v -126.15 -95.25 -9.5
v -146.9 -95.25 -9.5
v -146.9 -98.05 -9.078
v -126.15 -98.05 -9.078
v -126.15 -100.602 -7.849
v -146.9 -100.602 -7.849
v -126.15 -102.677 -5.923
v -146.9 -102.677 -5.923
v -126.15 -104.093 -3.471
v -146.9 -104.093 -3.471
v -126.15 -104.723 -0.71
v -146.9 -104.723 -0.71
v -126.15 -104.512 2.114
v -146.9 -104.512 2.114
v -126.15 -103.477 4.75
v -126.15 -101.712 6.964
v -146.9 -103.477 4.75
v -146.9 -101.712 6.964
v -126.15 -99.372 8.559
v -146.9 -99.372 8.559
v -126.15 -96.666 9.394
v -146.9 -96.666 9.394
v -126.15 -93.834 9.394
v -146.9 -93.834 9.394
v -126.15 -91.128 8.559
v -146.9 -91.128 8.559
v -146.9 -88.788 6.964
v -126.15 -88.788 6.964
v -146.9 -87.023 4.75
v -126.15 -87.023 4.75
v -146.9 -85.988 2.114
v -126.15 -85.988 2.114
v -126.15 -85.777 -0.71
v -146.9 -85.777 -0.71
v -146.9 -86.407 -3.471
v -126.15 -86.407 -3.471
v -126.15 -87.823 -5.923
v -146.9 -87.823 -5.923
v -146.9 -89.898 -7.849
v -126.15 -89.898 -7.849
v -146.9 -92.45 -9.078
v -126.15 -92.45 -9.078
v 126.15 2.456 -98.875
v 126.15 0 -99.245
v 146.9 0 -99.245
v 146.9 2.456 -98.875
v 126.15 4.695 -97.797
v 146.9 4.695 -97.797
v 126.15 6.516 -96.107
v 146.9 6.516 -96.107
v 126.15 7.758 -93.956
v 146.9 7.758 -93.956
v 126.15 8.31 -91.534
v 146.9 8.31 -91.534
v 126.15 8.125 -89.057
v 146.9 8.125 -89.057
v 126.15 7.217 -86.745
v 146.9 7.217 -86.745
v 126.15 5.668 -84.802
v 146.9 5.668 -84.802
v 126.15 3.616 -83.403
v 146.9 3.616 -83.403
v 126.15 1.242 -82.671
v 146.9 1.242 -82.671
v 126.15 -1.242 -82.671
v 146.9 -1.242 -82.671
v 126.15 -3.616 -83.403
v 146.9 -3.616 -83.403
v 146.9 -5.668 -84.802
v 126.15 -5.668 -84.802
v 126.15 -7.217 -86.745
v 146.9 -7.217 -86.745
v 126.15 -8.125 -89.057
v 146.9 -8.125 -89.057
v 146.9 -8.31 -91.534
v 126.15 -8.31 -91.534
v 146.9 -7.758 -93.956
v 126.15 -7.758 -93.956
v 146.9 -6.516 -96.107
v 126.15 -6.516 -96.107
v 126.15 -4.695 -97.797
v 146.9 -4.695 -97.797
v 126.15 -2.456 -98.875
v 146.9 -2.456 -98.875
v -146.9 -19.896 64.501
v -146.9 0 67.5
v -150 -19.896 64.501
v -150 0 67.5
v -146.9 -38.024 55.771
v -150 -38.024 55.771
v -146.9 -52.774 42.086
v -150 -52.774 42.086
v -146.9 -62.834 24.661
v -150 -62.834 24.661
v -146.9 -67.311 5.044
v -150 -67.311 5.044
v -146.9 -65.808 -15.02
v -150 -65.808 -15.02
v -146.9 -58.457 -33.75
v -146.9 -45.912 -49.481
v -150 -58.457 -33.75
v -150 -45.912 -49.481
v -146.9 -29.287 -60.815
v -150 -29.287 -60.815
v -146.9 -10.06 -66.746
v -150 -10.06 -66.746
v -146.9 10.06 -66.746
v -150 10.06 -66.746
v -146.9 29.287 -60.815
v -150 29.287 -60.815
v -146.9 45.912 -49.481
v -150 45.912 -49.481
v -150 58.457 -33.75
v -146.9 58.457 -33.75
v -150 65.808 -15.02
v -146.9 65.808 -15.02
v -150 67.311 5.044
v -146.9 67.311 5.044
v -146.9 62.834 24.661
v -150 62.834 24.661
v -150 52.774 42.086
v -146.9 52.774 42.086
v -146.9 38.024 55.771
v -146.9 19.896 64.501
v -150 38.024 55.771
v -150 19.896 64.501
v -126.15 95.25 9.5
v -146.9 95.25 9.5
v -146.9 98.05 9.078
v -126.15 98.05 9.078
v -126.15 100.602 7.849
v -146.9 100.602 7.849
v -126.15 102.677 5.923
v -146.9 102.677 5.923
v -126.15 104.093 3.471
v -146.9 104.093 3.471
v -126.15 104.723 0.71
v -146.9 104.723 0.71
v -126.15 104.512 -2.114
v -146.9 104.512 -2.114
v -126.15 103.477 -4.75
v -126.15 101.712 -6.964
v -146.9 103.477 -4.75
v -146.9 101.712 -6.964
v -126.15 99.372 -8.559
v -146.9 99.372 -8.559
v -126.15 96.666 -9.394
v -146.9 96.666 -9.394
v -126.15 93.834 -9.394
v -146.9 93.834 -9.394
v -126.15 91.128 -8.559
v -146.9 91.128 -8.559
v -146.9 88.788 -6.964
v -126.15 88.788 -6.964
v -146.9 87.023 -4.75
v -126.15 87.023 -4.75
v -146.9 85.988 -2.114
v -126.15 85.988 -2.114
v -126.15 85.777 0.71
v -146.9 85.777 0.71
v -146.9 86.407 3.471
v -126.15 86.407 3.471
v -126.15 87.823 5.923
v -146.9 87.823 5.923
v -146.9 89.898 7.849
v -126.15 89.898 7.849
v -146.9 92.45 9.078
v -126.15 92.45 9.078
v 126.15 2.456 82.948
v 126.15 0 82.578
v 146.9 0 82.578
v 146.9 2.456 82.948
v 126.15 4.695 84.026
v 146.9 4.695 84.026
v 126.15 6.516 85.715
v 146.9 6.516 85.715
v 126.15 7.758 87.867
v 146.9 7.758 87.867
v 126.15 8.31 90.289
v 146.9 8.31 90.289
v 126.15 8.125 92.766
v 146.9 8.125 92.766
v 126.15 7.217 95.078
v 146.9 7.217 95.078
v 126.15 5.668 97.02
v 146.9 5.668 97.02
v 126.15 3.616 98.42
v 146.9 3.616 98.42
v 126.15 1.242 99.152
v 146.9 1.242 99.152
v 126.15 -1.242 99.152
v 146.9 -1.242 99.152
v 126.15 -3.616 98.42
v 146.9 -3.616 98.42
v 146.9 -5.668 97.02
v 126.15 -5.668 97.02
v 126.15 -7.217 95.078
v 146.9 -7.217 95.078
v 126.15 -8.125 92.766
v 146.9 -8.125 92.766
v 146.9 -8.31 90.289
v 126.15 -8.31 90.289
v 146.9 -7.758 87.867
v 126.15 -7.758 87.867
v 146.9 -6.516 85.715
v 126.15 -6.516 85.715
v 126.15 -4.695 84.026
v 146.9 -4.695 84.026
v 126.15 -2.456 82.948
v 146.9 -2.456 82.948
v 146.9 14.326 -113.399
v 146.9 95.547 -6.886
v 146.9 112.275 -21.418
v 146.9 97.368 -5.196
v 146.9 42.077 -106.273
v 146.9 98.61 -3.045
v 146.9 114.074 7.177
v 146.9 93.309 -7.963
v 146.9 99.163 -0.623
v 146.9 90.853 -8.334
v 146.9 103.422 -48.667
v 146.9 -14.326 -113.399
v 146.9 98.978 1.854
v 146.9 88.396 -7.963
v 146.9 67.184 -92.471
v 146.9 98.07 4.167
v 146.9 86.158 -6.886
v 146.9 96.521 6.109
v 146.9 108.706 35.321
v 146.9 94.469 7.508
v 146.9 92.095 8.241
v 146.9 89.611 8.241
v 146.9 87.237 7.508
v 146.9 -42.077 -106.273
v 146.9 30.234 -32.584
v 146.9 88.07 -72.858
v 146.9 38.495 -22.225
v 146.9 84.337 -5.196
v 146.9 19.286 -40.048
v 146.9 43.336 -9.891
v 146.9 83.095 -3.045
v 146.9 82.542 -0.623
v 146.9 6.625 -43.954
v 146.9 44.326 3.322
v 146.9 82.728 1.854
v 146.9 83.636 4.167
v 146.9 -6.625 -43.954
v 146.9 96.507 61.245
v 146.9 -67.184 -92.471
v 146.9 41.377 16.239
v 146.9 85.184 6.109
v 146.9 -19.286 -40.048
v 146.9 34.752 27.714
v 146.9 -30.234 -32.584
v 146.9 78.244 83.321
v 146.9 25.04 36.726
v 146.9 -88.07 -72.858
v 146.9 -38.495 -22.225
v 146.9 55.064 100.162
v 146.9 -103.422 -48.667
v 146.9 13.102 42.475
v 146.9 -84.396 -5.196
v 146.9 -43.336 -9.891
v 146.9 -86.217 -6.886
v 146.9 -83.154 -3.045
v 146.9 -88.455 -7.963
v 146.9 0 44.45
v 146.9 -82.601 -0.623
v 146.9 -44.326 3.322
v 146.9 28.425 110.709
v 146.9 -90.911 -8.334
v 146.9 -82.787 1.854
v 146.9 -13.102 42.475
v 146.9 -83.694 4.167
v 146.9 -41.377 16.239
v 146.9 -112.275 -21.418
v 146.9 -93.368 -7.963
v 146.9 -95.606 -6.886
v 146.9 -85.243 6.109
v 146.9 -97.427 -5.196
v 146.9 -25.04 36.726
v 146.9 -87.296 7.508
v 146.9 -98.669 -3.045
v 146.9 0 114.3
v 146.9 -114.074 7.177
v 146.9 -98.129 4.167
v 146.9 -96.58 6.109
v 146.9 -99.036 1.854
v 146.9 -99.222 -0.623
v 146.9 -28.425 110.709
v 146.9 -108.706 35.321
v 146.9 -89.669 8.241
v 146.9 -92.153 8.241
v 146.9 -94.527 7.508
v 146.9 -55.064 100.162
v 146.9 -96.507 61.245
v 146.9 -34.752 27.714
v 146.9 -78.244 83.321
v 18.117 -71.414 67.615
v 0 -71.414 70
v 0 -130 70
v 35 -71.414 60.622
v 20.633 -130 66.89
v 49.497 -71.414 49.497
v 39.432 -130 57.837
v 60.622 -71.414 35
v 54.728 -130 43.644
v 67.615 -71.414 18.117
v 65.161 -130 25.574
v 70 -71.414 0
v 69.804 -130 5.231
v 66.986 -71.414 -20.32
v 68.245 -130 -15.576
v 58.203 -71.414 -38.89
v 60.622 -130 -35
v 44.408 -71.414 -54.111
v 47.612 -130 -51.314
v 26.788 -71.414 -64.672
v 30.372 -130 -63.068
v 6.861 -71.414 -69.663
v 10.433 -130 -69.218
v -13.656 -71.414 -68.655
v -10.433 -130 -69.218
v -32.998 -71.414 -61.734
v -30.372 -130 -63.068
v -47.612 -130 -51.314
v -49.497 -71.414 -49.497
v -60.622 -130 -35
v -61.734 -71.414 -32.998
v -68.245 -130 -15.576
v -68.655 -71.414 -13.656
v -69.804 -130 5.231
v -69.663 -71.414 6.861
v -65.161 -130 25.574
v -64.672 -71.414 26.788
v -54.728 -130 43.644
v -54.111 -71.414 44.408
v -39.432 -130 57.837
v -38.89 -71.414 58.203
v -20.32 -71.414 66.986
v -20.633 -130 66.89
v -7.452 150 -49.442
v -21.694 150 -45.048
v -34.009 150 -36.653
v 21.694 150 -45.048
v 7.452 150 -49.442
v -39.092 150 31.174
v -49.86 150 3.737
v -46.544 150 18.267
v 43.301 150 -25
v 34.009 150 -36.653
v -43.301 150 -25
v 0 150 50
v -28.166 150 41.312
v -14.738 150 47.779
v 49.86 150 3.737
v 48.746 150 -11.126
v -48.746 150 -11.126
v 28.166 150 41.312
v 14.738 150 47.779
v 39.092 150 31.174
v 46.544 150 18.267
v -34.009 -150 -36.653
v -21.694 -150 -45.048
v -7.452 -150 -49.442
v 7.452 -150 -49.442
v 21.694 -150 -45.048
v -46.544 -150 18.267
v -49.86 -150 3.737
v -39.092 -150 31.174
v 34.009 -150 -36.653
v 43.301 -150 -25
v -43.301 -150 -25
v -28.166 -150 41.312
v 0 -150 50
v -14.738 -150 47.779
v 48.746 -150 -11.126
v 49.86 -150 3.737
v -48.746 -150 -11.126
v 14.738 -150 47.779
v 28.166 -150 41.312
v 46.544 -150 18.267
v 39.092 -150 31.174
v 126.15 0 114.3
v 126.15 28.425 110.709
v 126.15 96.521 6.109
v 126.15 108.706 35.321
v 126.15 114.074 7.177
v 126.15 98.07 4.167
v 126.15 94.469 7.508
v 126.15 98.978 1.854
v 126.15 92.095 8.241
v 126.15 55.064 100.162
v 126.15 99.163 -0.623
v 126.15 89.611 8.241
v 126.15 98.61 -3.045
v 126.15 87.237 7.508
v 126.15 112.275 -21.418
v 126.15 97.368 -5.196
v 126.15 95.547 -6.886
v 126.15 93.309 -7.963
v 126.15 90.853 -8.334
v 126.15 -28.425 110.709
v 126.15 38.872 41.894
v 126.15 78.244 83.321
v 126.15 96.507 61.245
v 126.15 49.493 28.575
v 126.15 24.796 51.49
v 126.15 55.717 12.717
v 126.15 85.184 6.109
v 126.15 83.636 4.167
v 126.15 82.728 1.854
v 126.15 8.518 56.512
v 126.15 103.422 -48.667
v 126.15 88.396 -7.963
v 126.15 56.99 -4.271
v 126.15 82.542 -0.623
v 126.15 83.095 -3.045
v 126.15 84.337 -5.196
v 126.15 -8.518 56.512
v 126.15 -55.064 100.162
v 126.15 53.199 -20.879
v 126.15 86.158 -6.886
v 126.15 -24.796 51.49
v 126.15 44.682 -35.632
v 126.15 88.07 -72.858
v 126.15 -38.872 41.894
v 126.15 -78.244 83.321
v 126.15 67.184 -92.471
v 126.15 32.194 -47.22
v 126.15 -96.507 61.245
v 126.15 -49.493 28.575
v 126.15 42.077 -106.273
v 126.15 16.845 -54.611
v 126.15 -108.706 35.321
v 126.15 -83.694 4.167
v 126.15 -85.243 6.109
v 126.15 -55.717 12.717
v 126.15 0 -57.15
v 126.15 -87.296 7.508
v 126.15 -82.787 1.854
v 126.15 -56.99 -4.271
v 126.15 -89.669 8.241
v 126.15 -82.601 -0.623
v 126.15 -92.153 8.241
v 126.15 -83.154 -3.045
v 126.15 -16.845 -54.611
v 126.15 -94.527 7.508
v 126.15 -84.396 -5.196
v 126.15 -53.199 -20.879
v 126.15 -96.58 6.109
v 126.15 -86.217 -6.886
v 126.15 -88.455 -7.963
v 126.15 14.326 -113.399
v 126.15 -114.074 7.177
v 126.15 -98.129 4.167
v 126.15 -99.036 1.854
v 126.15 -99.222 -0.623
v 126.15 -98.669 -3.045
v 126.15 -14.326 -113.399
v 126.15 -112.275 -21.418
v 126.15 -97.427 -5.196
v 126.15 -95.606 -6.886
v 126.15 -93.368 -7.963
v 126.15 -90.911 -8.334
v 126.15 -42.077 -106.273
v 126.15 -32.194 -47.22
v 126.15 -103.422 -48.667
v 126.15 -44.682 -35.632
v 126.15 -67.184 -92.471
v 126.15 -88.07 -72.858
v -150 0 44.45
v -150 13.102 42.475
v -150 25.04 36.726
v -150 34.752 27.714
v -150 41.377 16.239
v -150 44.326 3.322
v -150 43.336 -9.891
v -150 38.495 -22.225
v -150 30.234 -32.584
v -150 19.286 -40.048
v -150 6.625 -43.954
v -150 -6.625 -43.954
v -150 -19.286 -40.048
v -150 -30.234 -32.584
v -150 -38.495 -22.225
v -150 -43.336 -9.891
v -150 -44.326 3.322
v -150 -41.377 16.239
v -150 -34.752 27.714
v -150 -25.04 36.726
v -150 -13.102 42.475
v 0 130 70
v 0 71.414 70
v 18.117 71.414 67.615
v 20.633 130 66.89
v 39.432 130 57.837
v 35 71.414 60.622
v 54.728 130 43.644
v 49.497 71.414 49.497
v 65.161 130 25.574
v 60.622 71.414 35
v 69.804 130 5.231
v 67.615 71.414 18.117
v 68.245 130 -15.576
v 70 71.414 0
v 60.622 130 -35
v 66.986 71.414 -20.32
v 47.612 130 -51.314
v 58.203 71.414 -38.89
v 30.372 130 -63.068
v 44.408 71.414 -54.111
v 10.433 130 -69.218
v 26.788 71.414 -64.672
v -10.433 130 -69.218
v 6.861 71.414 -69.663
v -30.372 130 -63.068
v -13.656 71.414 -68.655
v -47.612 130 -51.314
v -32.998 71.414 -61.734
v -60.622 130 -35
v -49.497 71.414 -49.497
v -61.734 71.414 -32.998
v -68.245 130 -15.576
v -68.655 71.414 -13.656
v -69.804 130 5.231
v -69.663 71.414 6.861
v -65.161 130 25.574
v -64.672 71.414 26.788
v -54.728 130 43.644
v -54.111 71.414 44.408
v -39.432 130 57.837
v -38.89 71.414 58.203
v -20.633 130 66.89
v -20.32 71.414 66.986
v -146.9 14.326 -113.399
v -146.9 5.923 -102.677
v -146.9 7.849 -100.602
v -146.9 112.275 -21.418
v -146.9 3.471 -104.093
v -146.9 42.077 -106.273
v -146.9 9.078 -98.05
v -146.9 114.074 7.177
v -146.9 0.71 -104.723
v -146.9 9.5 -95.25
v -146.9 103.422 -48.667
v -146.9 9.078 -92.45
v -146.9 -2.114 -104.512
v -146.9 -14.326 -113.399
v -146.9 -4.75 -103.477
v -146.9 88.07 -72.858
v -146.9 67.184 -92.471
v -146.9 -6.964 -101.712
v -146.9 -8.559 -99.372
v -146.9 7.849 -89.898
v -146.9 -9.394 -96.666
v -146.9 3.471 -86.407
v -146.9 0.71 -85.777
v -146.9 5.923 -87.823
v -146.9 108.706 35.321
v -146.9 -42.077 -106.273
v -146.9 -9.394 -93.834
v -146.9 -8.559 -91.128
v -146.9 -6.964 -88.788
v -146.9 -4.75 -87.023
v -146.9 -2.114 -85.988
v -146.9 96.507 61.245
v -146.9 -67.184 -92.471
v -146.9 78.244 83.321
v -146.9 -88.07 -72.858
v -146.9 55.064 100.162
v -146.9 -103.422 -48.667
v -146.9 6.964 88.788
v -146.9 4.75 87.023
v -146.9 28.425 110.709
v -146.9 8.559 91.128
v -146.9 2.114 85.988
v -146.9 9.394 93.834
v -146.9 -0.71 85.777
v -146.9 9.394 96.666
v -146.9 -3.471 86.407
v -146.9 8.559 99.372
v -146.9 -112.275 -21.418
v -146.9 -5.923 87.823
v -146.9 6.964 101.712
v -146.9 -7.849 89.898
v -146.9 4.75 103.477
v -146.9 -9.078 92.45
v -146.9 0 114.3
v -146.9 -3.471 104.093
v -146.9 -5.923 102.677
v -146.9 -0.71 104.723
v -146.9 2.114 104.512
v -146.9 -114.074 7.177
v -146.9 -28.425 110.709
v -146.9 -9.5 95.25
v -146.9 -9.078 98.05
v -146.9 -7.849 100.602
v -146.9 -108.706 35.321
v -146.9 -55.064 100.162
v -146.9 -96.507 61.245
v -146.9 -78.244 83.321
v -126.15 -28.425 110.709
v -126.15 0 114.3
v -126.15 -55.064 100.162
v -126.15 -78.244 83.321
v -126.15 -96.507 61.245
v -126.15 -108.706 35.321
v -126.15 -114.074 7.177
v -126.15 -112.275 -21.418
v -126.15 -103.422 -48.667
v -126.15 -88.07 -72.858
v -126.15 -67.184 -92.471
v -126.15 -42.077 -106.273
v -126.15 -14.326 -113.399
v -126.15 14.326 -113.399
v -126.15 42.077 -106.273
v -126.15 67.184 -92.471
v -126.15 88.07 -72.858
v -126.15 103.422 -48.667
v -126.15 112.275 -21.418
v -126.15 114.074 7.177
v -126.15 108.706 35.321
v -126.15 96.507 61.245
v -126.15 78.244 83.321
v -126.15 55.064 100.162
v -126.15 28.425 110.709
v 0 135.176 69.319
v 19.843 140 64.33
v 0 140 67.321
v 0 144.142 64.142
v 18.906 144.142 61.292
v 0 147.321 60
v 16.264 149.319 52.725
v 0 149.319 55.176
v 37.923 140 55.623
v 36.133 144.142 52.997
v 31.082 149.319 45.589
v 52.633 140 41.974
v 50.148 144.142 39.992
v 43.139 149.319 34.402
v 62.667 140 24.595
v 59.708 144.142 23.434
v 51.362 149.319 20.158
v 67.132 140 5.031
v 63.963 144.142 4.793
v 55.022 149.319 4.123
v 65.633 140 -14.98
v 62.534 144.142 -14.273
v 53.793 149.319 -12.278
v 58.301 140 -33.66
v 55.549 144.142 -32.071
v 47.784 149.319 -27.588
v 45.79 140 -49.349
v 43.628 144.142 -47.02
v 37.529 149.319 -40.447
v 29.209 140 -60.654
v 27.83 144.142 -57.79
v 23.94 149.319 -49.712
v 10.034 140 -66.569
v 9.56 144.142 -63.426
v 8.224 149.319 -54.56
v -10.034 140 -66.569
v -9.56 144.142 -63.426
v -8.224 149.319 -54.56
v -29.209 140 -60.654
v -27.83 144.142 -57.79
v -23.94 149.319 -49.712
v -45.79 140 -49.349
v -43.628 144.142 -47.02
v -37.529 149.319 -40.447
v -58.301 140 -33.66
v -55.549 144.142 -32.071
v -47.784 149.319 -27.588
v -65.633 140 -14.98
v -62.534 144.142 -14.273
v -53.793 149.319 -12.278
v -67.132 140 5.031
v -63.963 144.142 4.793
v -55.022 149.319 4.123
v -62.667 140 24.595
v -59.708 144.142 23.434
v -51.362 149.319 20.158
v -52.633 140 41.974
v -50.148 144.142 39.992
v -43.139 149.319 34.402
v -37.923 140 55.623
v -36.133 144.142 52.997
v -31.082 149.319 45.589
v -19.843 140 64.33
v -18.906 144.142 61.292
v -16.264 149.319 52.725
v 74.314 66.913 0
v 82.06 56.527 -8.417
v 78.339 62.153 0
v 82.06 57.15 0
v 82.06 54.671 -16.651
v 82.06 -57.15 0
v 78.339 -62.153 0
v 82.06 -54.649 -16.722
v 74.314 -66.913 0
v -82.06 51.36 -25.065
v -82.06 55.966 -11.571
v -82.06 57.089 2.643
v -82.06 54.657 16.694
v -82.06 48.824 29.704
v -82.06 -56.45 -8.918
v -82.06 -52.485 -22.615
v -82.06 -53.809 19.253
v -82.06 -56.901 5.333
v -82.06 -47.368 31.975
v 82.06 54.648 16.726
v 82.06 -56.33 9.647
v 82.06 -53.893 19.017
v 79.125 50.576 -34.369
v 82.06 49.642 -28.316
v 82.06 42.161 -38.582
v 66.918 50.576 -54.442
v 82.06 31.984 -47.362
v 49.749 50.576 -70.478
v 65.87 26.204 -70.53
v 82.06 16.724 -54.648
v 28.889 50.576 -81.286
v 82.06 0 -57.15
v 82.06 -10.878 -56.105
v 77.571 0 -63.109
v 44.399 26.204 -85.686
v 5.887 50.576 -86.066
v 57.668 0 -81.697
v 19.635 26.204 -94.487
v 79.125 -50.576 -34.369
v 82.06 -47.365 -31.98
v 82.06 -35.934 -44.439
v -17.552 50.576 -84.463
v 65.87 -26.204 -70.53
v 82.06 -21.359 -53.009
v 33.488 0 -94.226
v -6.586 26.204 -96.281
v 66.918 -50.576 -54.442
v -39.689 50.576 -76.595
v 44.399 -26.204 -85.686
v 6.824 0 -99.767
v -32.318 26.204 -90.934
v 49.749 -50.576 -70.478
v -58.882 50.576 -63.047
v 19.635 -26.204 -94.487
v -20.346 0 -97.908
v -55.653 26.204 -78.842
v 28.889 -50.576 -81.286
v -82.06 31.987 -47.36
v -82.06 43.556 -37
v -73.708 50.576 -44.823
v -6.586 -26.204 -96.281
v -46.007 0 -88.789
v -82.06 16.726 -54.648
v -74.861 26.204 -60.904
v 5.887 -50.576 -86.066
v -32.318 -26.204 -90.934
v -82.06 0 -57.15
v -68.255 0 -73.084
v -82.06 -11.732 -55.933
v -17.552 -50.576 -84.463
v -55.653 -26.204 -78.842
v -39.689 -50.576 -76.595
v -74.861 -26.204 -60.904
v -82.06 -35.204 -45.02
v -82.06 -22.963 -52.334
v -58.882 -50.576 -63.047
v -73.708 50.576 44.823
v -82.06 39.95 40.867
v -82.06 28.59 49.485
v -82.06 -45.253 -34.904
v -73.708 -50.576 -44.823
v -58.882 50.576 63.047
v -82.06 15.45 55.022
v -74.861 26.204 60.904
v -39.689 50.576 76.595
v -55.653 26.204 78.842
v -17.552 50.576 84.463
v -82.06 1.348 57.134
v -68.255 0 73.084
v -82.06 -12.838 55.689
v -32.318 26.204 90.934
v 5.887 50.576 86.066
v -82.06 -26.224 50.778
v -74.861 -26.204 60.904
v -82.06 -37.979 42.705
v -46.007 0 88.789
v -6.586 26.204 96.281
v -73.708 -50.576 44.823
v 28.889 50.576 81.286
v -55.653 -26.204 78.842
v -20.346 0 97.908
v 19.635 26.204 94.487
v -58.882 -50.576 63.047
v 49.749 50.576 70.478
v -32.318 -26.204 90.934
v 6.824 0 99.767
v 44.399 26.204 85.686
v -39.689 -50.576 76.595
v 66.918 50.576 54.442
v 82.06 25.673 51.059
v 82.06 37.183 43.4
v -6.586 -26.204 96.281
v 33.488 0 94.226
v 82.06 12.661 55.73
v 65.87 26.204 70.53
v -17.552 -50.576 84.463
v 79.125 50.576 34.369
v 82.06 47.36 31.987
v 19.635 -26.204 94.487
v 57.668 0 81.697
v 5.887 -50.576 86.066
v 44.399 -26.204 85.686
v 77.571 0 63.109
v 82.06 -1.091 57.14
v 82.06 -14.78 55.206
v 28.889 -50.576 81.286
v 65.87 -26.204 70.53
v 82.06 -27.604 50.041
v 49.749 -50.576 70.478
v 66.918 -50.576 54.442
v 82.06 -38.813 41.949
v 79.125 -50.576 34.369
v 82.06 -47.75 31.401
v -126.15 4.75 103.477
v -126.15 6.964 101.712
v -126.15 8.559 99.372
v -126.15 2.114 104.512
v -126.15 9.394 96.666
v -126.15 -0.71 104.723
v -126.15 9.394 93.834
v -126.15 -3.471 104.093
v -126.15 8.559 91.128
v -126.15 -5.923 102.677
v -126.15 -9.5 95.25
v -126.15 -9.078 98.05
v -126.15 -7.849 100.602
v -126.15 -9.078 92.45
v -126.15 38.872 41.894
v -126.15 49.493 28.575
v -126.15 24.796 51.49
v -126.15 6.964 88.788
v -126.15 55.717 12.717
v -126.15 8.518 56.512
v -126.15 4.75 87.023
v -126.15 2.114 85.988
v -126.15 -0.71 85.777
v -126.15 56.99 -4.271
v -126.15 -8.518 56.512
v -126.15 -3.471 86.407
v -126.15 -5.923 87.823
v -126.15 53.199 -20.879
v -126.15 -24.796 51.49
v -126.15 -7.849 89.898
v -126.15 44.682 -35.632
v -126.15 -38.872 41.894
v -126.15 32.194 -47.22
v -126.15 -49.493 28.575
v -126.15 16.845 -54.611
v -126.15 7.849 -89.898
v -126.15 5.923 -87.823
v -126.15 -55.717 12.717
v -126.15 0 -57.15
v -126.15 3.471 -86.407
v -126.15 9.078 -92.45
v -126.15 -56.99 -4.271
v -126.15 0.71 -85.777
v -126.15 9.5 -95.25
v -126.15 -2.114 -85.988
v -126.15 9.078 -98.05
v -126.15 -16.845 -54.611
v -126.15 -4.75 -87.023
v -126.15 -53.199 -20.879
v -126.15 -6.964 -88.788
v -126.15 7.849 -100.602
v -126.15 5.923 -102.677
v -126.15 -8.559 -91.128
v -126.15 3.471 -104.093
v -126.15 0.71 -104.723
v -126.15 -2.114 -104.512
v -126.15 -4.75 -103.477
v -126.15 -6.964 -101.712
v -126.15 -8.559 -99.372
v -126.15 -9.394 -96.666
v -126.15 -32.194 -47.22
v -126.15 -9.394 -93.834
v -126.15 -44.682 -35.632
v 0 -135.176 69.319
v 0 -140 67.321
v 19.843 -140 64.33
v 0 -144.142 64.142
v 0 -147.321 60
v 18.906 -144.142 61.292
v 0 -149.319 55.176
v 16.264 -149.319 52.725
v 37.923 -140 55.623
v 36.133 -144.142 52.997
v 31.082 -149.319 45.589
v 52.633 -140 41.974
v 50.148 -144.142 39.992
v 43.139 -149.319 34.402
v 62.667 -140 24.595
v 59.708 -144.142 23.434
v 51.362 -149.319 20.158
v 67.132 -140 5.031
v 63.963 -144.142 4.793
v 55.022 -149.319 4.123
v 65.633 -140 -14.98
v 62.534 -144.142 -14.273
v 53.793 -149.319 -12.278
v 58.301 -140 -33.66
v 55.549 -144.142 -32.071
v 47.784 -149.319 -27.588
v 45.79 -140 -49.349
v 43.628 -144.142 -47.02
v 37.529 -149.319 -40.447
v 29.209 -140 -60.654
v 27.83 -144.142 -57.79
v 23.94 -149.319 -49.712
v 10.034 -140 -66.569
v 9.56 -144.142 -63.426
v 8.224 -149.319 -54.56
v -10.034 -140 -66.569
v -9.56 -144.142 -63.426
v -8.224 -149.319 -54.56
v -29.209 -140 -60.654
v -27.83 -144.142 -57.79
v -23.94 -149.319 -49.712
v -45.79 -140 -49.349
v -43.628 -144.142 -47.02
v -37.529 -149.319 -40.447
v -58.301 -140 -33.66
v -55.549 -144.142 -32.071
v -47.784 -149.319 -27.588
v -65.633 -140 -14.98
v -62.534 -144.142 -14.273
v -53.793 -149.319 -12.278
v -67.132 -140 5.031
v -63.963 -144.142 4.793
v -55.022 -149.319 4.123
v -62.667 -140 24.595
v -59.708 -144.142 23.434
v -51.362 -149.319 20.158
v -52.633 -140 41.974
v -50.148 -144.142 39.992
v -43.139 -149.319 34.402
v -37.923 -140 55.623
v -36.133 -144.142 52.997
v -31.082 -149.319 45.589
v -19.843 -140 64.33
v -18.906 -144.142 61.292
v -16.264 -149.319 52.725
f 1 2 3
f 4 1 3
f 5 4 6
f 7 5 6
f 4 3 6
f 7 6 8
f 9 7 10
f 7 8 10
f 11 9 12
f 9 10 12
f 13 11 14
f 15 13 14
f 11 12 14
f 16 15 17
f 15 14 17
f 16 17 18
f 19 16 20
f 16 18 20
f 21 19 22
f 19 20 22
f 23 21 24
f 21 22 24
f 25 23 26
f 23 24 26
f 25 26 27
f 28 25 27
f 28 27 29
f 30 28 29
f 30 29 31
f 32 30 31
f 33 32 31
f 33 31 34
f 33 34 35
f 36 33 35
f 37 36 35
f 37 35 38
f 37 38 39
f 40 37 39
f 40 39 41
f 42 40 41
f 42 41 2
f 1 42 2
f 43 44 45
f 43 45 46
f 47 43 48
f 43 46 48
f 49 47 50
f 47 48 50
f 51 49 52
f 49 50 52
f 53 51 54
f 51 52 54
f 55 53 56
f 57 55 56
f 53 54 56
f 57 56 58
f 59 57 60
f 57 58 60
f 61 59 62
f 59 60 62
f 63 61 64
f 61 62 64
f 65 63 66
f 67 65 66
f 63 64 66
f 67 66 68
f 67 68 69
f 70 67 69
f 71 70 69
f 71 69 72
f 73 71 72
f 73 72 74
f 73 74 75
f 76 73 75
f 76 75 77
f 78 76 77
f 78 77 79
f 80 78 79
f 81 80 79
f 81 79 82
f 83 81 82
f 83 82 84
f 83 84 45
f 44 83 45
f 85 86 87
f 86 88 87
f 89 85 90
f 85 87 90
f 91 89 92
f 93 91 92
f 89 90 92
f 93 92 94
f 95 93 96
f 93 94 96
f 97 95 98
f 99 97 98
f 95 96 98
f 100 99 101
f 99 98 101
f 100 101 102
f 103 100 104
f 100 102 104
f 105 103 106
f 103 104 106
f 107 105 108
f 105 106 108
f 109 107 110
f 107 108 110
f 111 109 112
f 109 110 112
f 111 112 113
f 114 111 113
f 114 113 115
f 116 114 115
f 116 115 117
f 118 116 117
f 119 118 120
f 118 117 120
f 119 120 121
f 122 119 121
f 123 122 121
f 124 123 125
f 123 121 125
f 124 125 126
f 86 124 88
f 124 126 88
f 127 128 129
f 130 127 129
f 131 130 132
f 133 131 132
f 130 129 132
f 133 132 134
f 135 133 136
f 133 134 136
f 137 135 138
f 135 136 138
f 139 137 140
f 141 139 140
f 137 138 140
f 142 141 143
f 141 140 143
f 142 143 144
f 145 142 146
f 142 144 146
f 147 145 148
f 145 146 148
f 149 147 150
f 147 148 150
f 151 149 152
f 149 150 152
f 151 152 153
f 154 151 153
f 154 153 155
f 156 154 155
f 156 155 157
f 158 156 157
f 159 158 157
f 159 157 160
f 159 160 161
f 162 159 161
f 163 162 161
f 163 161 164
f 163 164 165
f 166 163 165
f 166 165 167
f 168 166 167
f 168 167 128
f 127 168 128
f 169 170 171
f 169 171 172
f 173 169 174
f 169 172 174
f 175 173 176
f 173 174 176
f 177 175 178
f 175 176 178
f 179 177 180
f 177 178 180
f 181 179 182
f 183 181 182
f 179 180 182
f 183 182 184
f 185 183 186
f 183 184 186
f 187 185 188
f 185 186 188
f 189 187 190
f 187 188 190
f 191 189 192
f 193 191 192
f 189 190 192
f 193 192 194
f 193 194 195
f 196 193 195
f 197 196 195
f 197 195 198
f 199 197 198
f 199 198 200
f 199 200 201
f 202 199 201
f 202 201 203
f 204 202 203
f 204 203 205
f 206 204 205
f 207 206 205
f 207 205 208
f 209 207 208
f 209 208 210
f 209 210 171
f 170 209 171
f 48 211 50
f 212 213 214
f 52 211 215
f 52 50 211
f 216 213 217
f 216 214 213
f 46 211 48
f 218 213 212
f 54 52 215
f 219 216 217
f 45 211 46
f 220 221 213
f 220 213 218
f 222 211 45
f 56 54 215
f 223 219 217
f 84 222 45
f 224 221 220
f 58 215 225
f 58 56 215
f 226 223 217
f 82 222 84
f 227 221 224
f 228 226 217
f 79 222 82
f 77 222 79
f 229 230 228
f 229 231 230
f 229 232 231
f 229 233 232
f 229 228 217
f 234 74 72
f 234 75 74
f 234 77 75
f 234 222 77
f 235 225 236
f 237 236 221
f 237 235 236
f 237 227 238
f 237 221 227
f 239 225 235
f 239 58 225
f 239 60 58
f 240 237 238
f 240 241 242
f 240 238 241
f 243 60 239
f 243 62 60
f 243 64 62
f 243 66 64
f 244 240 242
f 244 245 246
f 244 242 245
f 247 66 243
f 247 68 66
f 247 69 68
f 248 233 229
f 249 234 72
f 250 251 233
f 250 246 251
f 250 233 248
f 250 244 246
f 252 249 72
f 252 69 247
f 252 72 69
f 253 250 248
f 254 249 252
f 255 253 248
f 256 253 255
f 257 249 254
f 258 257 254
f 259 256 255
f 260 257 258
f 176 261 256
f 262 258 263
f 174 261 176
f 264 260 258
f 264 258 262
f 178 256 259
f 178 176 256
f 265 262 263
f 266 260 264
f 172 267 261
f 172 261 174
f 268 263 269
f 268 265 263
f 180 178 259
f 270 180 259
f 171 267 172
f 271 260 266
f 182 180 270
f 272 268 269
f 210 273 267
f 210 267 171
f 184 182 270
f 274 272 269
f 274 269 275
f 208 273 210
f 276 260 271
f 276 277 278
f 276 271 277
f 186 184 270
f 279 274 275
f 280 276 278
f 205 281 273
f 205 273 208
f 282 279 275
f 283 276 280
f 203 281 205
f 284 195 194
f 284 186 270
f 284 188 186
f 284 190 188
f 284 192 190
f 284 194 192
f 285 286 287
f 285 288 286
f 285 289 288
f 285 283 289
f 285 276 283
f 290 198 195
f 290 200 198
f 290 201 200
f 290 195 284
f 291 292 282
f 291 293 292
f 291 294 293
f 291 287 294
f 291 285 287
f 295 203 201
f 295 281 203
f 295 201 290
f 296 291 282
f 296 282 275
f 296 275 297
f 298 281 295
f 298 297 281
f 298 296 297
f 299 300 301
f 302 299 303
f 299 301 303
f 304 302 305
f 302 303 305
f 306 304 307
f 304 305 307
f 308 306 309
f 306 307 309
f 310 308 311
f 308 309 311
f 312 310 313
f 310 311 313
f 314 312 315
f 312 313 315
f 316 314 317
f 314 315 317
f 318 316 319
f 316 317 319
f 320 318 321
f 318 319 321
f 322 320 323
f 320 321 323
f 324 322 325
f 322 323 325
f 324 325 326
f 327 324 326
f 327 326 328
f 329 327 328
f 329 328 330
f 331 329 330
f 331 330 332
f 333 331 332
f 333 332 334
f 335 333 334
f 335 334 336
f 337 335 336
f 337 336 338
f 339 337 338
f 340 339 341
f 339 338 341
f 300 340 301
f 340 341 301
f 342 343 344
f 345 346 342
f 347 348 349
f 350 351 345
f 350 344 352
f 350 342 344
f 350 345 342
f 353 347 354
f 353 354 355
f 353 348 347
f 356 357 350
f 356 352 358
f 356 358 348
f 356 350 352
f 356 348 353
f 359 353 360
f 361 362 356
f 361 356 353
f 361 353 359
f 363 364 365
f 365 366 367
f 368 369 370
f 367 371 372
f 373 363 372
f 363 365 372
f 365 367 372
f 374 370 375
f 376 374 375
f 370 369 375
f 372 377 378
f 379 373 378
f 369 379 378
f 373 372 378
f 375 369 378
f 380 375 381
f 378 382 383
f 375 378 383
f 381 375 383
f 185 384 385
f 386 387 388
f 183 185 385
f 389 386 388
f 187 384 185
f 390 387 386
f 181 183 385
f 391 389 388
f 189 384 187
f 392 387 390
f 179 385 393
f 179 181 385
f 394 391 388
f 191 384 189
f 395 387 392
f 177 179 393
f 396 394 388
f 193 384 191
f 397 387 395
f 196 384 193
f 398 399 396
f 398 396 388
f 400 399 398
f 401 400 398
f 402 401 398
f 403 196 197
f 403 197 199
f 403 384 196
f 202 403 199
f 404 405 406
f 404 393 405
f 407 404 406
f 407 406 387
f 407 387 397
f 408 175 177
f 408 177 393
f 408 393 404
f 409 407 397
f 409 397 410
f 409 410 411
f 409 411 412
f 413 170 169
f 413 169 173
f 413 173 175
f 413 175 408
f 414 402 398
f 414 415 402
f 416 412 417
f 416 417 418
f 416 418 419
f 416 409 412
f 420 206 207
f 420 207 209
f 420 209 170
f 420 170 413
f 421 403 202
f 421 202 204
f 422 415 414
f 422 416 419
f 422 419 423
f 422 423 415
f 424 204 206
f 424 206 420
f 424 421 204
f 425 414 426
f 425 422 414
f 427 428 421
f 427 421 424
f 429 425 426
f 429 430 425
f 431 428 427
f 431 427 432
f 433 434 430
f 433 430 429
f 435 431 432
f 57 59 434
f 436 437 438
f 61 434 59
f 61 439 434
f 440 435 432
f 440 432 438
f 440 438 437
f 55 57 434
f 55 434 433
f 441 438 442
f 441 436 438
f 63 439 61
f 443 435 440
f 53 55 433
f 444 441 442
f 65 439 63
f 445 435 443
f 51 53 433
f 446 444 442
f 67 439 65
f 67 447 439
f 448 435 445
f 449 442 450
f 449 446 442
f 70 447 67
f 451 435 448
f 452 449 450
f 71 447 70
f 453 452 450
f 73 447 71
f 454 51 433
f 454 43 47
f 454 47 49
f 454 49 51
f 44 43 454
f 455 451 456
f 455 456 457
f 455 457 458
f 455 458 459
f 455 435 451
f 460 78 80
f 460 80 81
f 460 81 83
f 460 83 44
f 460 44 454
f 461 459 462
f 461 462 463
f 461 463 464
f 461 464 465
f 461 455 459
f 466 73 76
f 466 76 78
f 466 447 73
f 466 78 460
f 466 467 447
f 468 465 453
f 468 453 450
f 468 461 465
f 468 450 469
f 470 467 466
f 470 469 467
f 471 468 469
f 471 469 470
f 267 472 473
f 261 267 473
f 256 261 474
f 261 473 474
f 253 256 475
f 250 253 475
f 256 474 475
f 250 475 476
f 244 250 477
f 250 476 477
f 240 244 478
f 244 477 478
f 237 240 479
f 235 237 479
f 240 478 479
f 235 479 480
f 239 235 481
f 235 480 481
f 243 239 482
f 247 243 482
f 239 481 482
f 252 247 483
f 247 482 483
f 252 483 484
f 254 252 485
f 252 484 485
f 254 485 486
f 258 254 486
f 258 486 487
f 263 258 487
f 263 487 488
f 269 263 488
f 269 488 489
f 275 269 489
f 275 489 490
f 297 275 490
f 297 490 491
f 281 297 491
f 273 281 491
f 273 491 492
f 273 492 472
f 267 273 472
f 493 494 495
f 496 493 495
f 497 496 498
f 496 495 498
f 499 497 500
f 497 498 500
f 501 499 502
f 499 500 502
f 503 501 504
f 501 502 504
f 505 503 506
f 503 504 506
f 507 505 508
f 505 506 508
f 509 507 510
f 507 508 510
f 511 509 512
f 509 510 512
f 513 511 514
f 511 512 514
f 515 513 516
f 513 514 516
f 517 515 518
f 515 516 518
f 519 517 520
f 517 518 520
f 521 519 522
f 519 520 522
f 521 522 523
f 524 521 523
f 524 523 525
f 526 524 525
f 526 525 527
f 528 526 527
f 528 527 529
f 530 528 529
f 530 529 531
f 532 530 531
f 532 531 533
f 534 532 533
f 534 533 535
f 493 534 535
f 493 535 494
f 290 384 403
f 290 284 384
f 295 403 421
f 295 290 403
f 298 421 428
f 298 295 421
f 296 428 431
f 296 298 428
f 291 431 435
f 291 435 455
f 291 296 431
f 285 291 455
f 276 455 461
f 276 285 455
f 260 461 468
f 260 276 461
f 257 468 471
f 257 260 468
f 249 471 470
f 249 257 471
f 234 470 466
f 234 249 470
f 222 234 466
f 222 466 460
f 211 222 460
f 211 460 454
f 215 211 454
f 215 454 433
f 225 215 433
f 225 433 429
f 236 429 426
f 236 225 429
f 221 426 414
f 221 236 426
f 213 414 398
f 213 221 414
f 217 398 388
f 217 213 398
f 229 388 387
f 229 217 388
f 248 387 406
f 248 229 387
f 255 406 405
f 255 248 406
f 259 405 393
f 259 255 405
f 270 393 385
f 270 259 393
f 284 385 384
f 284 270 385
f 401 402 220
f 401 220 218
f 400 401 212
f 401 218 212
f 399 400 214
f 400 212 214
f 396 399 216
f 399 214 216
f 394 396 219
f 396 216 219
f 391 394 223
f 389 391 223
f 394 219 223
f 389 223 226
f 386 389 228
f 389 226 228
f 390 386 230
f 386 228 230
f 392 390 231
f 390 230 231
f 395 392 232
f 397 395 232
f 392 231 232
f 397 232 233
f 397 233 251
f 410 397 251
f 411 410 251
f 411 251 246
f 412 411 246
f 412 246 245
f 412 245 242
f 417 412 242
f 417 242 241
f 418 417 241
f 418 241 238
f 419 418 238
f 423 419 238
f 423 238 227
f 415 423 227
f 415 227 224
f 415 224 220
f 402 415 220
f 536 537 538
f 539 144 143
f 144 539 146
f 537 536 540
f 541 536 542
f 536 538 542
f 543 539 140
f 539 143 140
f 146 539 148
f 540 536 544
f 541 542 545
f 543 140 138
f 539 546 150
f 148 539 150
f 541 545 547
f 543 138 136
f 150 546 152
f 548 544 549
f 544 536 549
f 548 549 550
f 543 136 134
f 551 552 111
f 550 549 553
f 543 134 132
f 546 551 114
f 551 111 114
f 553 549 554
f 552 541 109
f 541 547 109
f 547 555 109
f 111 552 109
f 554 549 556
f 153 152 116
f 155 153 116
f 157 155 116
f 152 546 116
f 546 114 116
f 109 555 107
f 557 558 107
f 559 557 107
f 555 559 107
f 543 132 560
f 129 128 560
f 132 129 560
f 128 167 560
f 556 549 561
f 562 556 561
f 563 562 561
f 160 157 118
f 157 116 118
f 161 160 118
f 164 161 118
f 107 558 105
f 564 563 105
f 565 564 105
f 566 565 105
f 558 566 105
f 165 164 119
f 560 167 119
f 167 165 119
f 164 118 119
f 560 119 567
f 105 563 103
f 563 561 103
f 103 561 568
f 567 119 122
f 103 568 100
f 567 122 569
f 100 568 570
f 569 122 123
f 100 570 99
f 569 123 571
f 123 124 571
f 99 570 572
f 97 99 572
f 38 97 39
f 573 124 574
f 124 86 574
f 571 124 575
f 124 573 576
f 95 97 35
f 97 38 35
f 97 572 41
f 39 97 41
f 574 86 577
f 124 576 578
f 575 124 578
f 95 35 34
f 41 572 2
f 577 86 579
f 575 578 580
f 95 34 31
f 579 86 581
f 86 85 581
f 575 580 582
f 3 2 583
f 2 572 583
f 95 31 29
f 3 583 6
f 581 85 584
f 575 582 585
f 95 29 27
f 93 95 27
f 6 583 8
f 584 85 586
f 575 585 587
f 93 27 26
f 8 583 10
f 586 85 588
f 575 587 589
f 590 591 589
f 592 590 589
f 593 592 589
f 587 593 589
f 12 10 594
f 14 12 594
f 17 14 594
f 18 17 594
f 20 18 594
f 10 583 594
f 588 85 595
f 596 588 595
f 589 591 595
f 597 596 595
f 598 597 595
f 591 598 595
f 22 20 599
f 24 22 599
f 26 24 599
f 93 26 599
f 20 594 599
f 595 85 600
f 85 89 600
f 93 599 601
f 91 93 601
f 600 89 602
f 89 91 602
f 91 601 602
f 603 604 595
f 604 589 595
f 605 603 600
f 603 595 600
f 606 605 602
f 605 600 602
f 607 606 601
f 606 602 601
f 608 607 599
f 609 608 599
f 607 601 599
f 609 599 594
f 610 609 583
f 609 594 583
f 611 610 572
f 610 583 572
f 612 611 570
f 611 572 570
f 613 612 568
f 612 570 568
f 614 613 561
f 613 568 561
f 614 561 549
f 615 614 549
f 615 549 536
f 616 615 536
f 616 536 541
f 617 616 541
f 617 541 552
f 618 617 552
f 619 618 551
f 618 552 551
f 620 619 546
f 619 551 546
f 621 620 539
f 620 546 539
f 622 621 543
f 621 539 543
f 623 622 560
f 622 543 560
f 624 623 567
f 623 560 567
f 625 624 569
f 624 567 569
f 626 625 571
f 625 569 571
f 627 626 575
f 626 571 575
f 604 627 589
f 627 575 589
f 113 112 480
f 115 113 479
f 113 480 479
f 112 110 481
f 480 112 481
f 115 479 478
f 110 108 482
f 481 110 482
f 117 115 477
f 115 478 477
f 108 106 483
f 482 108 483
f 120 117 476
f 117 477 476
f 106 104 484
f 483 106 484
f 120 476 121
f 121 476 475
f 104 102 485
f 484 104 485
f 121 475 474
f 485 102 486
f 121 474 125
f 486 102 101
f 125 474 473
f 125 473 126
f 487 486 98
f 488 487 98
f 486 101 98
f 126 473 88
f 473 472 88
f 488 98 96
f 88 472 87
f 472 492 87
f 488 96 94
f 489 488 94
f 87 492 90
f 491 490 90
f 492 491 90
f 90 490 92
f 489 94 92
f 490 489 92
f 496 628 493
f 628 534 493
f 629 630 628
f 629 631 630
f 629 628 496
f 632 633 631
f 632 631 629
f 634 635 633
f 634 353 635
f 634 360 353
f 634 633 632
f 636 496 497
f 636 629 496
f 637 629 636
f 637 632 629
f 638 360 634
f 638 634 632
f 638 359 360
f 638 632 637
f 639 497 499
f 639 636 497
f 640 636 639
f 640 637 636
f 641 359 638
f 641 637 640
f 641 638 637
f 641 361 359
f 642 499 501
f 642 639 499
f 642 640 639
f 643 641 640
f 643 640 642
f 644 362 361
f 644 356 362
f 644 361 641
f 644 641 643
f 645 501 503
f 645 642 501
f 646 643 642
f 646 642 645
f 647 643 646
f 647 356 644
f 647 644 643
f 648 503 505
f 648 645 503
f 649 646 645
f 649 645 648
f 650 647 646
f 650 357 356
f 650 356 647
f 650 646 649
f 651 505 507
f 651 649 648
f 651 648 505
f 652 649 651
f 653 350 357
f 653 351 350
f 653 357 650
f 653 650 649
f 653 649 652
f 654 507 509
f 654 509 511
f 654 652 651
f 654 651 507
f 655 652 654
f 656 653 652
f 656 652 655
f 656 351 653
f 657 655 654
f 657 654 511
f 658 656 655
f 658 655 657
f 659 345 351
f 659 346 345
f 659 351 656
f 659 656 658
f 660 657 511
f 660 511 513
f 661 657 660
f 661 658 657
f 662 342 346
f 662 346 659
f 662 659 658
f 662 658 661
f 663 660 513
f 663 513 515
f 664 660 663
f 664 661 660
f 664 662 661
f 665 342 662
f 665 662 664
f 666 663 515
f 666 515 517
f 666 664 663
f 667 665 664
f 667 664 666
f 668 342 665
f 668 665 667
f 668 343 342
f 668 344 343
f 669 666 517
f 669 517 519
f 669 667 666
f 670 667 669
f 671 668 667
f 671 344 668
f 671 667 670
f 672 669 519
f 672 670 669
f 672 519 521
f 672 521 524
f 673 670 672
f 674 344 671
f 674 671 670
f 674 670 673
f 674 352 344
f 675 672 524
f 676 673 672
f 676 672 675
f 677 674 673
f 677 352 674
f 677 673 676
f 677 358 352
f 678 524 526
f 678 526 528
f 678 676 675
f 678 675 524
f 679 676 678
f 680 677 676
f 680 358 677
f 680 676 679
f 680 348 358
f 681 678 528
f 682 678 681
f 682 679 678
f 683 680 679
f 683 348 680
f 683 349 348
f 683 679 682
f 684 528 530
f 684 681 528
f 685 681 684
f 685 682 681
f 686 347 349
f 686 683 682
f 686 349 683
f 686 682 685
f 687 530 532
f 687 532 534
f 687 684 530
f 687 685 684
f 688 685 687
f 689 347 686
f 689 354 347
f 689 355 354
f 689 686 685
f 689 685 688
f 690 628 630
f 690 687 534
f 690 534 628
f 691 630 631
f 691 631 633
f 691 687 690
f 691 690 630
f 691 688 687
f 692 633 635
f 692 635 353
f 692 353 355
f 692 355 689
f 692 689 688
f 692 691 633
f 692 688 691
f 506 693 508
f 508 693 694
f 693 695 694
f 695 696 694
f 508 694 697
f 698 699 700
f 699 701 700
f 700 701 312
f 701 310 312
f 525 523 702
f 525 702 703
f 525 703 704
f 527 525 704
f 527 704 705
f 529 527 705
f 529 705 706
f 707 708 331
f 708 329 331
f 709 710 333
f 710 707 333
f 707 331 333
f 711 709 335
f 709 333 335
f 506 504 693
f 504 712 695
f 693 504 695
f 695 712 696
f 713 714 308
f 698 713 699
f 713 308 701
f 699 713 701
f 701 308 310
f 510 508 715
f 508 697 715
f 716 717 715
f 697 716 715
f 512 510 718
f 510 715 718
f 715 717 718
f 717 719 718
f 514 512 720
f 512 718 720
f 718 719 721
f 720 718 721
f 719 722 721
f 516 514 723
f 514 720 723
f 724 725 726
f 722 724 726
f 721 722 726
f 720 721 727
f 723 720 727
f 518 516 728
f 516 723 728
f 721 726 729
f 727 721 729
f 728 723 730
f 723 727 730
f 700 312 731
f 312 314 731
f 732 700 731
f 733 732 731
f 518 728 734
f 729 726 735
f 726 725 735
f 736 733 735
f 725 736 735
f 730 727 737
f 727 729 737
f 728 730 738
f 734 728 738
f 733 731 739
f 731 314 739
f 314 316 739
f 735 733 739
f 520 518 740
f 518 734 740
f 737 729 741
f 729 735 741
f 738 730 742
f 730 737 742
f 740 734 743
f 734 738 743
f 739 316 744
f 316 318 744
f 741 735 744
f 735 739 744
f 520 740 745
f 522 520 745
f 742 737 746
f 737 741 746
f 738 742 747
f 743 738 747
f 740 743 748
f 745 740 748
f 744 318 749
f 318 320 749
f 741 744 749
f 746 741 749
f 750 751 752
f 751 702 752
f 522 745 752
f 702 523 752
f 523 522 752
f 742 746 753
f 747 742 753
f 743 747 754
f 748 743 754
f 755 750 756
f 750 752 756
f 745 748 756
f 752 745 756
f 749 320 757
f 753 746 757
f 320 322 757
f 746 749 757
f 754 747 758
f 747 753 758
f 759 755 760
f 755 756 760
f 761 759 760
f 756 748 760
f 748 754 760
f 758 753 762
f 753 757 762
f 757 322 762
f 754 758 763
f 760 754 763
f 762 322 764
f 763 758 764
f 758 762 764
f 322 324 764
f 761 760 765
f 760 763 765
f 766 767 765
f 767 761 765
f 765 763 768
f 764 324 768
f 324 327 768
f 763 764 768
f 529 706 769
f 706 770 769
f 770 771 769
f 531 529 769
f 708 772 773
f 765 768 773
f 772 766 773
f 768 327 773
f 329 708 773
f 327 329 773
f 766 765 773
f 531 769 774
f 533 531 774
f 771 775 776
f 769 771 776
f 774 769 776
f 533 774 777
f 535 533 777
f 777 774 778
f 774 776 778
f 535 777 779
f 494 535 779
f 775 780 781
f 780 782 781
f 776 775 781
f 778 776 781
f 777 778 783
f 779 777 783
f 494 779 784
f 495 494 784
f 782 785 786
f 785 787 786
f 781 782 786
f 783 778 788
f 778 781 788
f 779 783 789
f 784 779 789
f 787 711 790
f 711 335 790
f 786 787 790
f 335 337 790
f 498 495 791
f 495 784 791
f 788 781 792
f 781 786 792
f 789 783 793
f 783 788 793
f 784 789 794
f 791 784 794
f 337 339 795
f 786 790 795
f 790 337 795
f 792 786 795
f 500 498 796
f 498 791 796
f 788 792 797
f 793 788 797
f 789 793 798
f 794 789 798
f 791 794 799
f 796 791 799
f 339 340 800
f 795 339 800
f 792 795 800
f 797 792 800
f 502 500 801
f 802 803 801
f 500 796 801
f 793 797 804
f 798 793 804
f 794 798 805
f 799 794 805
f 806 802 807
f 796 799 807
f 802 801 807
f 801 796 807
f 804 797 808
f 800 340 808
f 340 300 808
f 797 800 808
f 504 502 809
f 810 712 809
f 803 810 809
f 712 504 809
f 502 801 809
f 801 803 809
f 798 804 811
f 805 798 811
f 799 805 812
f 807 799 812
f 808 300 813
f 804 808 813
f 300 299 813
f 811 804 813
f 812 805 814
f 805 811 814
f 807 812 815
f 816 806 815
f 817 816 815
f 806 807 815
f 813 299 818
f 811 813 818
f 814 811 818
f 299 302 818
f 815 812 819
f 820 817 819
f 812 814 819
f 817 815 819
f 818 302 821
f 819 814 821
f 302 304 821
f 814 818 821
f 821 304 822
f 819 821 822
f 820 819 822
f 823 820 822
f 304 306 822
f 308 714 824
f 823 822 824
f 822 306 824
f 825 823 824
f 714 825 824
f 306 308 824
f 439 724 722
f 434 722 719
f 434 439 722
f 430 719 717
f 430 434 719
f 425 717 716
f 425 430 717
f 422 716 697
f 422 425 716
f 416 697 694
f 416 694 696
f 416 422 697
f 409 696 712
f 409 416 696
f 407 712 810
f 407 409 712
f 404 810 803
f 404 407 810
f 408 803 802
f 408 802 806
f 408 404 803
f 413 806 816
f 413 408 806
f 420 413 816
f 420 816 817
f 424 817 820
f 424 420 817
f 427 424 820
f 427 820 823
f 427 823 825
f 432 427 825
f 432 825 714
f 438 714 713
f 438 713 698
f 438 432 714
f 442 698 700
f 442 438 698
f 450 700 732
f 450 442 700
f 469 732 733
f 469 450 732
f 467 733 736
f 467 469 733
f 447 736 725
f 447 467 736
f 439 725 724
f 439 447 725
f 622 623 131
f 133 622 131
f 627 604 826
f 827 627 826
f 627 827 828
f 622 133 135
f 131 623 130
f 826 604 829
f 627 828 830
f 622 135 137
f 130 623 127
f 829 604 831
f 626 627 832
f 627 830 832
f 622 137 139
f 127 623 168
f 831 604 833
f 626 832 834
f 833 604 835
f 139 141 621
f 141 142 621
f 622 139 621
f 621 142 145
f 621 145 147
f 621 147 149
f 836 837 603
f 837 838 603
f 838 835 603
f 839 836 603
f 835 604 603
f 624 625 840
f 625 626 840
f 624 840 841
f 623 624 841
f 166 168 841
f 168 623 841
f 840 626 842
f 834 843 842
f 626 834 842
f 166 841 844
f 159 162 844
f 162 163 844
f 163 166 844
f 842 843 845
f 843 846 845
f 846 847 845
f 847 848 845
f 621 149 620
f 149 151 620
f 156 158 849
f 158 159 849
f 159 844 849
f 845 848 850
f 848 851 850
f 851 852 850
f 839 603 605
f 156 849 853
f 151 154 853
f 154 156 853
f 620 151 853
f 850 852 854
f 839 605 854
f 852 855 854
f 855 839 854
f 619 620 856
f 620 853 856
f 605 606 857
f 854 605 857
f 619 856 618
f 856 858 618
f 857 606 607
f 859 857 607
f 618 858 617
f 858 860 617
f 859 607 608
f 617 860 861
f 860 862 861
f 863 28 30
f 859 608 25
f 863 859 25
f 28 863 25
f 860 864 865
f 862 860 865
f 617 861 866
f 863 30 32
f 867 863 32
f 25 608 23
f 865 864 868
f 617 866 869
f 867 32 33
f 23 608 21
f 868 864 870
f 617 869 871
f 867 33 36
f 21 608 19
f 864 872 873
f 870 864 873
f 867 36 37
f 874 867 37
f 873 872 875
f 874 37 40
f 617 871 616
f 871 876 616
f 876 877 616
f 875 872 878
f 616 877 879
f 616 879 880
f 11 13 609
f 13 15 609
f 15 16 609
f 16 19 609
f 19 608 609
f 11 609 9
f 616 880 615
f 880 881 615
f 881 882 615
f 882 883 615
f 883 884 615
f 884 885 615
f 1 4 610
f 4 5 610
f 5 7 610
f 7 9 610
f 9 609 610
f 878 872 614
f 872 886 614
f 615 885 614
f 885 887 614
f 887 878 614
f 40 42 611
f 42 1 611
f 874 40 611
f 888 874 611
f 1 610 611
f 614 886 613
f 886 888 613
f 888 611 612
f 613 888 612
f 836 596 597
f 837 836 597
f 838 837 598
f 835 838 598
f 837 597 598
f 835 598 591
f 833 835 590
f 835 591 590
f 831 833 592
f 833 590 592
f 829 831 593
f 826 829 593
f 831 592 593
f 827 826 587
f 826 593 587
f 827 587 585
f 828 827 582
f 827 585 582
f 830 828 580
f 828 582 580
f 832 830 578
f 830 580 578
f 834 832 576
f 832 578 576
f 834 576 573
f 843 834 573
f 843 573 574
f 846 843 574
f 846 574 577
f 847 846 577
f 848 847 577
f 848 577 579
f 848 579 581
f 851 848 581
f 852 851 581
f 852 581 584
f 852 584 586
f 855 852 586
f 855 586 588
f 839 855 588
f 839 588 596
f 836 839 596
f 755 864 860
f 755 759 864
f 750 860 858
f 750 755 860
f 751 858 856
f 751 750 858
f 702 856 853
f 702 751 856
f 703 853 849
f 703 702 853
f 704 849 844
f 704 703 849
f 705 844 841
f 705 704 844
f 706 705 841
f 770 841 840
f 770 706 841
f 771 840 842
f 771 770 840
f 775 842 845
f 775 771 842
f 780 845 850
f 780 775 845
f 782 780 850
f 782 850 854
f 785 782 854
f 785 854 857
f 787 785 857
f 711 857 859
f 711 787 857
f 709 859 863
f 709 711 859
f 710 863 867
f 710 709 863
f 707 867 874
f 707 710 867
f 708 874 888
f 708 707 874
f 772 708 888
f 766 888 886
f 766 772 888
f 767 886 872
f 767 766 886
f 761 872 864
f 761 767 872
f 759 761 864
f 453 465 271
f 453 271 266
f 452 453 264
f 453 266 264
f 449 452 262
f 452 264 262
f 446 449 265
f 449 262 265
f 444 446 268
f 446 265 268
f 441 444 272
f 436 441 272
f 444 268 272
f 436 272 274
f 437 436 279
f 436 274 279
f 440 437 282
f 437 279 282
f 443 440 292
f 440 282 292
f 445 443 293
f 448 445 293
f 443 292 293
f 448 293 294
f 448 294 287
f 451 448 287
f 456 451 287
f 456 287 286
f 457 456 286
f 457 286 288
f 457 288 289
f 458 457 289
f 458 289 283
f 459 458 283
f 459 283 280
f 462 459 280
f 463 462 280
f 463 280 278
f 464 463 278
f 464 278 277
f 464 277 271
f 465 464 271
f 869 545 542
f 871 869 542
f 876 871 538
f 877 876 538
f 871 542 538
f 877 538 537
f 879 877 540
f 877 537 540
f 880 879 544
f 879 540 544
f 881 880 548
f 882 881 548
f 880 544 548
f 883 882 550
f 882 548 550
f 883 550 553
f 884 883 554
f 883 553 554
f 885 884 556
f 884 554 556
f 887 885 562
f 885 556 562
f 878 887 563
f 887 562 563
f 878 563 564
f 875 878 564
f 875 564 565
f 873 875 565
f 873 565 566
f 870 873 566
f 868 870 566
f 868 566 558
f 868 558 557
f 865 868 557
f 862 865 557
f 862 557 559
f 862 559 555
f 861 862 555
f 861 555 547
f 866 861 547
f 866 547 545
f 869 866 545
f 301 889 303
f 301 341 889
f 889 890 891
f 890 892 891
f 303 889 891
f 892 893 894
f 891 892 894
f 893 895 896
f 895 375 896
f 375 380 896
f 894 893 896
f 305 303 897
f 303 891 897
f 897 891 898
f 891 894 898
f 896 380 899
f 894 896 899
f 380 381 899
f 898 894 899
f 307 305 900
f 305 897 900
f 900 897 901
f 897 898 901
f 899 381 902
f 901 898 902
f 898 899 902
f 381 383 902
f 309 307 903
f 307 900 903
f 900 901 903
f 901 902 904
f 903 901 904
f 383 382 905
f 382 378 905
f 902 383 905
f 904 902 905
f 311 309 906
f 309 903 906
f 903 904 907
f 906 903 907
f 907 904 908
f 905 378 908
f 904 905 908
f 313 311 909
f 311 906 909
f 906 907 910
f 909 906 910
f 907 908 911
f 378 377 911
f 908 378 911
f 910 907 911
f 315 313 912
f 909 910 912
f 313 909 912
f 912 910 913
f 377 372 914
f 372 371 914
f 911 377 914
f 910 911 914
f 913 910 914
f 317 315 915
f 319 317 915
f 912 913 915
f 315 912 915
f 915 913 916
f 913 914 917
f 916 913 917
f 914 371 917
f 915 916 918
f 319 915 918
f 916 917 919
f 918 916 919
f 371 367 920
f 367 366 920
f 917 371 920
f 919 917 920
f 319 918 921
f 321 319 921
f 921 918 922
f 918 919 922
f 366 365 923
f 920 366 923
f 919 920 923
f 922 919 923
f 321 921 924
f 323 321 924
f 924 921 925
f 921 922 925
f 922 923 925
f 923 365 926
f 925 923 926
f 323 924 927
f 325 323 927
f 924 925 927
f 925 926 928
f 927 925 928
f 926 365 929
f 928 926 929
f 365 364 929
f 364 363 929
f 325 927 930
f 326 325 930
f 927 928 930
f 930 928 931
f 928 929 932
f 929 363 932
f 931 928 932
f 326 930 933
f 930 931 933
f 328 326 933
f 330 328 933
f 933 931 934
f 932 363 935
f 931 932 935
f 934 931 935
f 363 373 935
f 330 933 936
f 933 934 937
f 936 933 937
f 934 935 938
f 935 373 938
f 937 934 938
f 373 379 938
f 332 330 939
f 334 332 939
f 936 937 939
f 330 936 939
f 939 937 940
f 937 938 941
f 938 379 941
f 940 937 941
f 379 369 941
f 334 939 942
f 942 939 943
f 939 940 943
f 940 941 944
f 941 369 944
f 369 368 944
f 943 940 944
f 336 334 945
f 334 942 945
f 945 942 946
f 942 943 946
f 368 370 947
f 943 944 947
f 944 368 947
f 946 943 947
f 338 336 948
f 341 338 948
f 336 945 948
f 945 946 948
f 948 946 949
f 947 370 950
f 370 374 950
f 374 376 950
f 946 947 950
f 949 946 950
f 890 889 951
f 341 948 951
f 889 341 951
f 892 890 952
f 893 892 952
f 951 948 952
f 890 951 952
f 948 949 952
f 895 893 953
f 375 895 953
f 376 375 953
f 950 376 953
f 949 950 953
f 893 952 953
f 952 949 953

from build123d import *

# Parameters (mm, degrees)
SKETCH1_R                   = 57.15
BASE_EXTRUDE_DEPTH          = 150
BOSS_EXTRUDE1_DEPTH         = 150
BOSS_EXTRUDE1_DEPTH_BACK    = 150
SKETCH2_R                   = 70
FILLET1_R                   = 20
SKETCH18_R                  = 44.45
CUT_EXTRUDE3_DEPTH          = 351.000000086
CUT_EXTRUDE2_REACH          = 353.73
SKETCH15_R                  = 9.5
CIRPATTERN2_COUNT           = 4
SKETCH22_R                  = 67.5
CUT_EXTRUDE5_DEPTH          = 3.1
F_5_8_CLEARANCE_HOLE1_D     = 16.66748
F_5_8_CLEARANCE_HOLE1_DEPTH = 20.75


with BuildPart() as part:
    # Sketch1 → Base-Extrude (new, symmetric)
    with BuildSketch(Plane(origin=(0, 0, 0), x_dir=(0, 0, -1), z_dir=(1, 0, 0))):
        Circle(SKETCH1_R)
    extrude(amount=BASE_EXTRUDE_DEPTH, both=True)

    # Sketch2 → Boss-Extrude1 (add, two sides: drawn at the far end of the back side and taken through both)
    with BuildSketch(Plane(origin=(0, 0, 0), x_dir=(1, 0, 0), z_dir=(0, 1, 0)).offset(-BOSS_EXTRUDE1_DEPTH_BACK)):
        with Locations(Location((0, 0, 0), (0, 0, 270))):
            Circle(SKETCH2_R)
    extrude(amount=BOSS_EXTRUDE1_DEPTH + BOSS_EXTRUDE1_DEPTH_BACK)

    # Sketch3 → Boss-Revolve1 (revolve)
    with BuildSketch(Plane.XY):
        with BuildLine():
            Line((0, -100), (0, 100))
            ThreePointArc((0, 100), (100, 0), (0, -100))
        make_face()
    revolve(axis=Axis((0, -115.862970753, 0), (0, 1, 0)))

    # Fillet1
    fillet1_edges = [part.edges().sort_by_distance(p)[0] for p in [
        (0, -150, -70),
        (0, 150, -70),
    ]]
    fillet(fillet1_edges, radius=FILLET1_R)

    # Sketch18 → Cut-Extrude3 (cut, through all)
    with BuildSketch(Plane.ZY.offset(150)):
        Circle(SKETCH18_R)
    extrude(amount=-CUT_EXTRUDE3_DEPTH, mode=Mode.SUBTRACT)

    # Sketch13 → Boss-Revolve4 (revolve)
    with BuildSketch(Plane.XY, mode=Mode.PRIVATE) as boss_revolve4_sk:
        Polygon((126.15, 57.15), (126.15, 114.3), (146.9, 114.3), (146.9, 67.5), (150, 67.5), (150, 57.15), align=None)
    boss_revolve4 = revolve(boss_revolve4_sk.sketch.rotate(Axis((0, 0, 0), (1, 0, 0)), 90), axis=Axis((0, 0, 0), (1, 0, 0)))

    # Mirror2: Boss-Revolve4 across plane
    add(boss_revolve4.mirror(Plane(origin=(0, 0, 0), x_dir=(0, 0, 1), z_dir=(1, 0, 0))))

    # Sketch15 → Cut-Extrude2 (cut, up to next)
    with BuildSketch(Plane.ZY.offset(146.9), mode=Mode.PRIVATE) as cut_extrude2_sk1:
        with Locations((0, 95.25)):
            Circle(SKETCH15_R)
    cut_extrude2_tool1 = extrude(cut_extrude2_sk1.sketch, amount=-CUT_EXTRUDE2_REACH, mode=Mode.PRIVATE) & part.part
    cut_extrude2 = cut_extrude2_tool1.solids().sort_by_distance((-146.9, 95.25, 0))[0]
    add(cut_extrude2, mode=Mode.SUBTRACT)

    # CirPattern2: Cut-Extrude2 ×4 about axis
    cirpattern2_axis = Axis((0, 0, 0), (1, 0, 0))
    for i in range(1, CIRPATTERN2_COUNT):
        add(cut_extrude2.rotate(cirpattern2_axis, i * 360 / CIRPATTERN2_COUNT), mode=Mode.SUBTRACT)

    # Sketch22 → Cut-Extrude5 (cut)
    with BuildSketch(Plane(origin=(146.9, 0, 0), x_dir=(0, 0, -1), z_dir=(1, 0, 0))):
        with Locations(Location((0, 0, 0), (0, 0, 180))):
            Circle(SKETCH22_R)
    extrude(amount=CUT_EXTRUDE5_DEPTH, mode=Mode.SUBTRACT)

    # 5/8 Clearance Hole1
    with Locations(Plane(origin=(126.15, -86.94526051, 61.229912904), x_dir=(0, 0, 1), z_dir=(-1, 0, 0))):
        with Locations((-61.229912904, 177.798020209), (29.681467244, 86.94526051), (-61.229912904, -3.966119638), (-152.141293051, 86.94526051)):
            Hole(F_5_8_CLEARANCE_HOLE1_D / 2, depth=F_5_8_CLEARANCE_HOLE1_DEPTH)


solid = part.part
